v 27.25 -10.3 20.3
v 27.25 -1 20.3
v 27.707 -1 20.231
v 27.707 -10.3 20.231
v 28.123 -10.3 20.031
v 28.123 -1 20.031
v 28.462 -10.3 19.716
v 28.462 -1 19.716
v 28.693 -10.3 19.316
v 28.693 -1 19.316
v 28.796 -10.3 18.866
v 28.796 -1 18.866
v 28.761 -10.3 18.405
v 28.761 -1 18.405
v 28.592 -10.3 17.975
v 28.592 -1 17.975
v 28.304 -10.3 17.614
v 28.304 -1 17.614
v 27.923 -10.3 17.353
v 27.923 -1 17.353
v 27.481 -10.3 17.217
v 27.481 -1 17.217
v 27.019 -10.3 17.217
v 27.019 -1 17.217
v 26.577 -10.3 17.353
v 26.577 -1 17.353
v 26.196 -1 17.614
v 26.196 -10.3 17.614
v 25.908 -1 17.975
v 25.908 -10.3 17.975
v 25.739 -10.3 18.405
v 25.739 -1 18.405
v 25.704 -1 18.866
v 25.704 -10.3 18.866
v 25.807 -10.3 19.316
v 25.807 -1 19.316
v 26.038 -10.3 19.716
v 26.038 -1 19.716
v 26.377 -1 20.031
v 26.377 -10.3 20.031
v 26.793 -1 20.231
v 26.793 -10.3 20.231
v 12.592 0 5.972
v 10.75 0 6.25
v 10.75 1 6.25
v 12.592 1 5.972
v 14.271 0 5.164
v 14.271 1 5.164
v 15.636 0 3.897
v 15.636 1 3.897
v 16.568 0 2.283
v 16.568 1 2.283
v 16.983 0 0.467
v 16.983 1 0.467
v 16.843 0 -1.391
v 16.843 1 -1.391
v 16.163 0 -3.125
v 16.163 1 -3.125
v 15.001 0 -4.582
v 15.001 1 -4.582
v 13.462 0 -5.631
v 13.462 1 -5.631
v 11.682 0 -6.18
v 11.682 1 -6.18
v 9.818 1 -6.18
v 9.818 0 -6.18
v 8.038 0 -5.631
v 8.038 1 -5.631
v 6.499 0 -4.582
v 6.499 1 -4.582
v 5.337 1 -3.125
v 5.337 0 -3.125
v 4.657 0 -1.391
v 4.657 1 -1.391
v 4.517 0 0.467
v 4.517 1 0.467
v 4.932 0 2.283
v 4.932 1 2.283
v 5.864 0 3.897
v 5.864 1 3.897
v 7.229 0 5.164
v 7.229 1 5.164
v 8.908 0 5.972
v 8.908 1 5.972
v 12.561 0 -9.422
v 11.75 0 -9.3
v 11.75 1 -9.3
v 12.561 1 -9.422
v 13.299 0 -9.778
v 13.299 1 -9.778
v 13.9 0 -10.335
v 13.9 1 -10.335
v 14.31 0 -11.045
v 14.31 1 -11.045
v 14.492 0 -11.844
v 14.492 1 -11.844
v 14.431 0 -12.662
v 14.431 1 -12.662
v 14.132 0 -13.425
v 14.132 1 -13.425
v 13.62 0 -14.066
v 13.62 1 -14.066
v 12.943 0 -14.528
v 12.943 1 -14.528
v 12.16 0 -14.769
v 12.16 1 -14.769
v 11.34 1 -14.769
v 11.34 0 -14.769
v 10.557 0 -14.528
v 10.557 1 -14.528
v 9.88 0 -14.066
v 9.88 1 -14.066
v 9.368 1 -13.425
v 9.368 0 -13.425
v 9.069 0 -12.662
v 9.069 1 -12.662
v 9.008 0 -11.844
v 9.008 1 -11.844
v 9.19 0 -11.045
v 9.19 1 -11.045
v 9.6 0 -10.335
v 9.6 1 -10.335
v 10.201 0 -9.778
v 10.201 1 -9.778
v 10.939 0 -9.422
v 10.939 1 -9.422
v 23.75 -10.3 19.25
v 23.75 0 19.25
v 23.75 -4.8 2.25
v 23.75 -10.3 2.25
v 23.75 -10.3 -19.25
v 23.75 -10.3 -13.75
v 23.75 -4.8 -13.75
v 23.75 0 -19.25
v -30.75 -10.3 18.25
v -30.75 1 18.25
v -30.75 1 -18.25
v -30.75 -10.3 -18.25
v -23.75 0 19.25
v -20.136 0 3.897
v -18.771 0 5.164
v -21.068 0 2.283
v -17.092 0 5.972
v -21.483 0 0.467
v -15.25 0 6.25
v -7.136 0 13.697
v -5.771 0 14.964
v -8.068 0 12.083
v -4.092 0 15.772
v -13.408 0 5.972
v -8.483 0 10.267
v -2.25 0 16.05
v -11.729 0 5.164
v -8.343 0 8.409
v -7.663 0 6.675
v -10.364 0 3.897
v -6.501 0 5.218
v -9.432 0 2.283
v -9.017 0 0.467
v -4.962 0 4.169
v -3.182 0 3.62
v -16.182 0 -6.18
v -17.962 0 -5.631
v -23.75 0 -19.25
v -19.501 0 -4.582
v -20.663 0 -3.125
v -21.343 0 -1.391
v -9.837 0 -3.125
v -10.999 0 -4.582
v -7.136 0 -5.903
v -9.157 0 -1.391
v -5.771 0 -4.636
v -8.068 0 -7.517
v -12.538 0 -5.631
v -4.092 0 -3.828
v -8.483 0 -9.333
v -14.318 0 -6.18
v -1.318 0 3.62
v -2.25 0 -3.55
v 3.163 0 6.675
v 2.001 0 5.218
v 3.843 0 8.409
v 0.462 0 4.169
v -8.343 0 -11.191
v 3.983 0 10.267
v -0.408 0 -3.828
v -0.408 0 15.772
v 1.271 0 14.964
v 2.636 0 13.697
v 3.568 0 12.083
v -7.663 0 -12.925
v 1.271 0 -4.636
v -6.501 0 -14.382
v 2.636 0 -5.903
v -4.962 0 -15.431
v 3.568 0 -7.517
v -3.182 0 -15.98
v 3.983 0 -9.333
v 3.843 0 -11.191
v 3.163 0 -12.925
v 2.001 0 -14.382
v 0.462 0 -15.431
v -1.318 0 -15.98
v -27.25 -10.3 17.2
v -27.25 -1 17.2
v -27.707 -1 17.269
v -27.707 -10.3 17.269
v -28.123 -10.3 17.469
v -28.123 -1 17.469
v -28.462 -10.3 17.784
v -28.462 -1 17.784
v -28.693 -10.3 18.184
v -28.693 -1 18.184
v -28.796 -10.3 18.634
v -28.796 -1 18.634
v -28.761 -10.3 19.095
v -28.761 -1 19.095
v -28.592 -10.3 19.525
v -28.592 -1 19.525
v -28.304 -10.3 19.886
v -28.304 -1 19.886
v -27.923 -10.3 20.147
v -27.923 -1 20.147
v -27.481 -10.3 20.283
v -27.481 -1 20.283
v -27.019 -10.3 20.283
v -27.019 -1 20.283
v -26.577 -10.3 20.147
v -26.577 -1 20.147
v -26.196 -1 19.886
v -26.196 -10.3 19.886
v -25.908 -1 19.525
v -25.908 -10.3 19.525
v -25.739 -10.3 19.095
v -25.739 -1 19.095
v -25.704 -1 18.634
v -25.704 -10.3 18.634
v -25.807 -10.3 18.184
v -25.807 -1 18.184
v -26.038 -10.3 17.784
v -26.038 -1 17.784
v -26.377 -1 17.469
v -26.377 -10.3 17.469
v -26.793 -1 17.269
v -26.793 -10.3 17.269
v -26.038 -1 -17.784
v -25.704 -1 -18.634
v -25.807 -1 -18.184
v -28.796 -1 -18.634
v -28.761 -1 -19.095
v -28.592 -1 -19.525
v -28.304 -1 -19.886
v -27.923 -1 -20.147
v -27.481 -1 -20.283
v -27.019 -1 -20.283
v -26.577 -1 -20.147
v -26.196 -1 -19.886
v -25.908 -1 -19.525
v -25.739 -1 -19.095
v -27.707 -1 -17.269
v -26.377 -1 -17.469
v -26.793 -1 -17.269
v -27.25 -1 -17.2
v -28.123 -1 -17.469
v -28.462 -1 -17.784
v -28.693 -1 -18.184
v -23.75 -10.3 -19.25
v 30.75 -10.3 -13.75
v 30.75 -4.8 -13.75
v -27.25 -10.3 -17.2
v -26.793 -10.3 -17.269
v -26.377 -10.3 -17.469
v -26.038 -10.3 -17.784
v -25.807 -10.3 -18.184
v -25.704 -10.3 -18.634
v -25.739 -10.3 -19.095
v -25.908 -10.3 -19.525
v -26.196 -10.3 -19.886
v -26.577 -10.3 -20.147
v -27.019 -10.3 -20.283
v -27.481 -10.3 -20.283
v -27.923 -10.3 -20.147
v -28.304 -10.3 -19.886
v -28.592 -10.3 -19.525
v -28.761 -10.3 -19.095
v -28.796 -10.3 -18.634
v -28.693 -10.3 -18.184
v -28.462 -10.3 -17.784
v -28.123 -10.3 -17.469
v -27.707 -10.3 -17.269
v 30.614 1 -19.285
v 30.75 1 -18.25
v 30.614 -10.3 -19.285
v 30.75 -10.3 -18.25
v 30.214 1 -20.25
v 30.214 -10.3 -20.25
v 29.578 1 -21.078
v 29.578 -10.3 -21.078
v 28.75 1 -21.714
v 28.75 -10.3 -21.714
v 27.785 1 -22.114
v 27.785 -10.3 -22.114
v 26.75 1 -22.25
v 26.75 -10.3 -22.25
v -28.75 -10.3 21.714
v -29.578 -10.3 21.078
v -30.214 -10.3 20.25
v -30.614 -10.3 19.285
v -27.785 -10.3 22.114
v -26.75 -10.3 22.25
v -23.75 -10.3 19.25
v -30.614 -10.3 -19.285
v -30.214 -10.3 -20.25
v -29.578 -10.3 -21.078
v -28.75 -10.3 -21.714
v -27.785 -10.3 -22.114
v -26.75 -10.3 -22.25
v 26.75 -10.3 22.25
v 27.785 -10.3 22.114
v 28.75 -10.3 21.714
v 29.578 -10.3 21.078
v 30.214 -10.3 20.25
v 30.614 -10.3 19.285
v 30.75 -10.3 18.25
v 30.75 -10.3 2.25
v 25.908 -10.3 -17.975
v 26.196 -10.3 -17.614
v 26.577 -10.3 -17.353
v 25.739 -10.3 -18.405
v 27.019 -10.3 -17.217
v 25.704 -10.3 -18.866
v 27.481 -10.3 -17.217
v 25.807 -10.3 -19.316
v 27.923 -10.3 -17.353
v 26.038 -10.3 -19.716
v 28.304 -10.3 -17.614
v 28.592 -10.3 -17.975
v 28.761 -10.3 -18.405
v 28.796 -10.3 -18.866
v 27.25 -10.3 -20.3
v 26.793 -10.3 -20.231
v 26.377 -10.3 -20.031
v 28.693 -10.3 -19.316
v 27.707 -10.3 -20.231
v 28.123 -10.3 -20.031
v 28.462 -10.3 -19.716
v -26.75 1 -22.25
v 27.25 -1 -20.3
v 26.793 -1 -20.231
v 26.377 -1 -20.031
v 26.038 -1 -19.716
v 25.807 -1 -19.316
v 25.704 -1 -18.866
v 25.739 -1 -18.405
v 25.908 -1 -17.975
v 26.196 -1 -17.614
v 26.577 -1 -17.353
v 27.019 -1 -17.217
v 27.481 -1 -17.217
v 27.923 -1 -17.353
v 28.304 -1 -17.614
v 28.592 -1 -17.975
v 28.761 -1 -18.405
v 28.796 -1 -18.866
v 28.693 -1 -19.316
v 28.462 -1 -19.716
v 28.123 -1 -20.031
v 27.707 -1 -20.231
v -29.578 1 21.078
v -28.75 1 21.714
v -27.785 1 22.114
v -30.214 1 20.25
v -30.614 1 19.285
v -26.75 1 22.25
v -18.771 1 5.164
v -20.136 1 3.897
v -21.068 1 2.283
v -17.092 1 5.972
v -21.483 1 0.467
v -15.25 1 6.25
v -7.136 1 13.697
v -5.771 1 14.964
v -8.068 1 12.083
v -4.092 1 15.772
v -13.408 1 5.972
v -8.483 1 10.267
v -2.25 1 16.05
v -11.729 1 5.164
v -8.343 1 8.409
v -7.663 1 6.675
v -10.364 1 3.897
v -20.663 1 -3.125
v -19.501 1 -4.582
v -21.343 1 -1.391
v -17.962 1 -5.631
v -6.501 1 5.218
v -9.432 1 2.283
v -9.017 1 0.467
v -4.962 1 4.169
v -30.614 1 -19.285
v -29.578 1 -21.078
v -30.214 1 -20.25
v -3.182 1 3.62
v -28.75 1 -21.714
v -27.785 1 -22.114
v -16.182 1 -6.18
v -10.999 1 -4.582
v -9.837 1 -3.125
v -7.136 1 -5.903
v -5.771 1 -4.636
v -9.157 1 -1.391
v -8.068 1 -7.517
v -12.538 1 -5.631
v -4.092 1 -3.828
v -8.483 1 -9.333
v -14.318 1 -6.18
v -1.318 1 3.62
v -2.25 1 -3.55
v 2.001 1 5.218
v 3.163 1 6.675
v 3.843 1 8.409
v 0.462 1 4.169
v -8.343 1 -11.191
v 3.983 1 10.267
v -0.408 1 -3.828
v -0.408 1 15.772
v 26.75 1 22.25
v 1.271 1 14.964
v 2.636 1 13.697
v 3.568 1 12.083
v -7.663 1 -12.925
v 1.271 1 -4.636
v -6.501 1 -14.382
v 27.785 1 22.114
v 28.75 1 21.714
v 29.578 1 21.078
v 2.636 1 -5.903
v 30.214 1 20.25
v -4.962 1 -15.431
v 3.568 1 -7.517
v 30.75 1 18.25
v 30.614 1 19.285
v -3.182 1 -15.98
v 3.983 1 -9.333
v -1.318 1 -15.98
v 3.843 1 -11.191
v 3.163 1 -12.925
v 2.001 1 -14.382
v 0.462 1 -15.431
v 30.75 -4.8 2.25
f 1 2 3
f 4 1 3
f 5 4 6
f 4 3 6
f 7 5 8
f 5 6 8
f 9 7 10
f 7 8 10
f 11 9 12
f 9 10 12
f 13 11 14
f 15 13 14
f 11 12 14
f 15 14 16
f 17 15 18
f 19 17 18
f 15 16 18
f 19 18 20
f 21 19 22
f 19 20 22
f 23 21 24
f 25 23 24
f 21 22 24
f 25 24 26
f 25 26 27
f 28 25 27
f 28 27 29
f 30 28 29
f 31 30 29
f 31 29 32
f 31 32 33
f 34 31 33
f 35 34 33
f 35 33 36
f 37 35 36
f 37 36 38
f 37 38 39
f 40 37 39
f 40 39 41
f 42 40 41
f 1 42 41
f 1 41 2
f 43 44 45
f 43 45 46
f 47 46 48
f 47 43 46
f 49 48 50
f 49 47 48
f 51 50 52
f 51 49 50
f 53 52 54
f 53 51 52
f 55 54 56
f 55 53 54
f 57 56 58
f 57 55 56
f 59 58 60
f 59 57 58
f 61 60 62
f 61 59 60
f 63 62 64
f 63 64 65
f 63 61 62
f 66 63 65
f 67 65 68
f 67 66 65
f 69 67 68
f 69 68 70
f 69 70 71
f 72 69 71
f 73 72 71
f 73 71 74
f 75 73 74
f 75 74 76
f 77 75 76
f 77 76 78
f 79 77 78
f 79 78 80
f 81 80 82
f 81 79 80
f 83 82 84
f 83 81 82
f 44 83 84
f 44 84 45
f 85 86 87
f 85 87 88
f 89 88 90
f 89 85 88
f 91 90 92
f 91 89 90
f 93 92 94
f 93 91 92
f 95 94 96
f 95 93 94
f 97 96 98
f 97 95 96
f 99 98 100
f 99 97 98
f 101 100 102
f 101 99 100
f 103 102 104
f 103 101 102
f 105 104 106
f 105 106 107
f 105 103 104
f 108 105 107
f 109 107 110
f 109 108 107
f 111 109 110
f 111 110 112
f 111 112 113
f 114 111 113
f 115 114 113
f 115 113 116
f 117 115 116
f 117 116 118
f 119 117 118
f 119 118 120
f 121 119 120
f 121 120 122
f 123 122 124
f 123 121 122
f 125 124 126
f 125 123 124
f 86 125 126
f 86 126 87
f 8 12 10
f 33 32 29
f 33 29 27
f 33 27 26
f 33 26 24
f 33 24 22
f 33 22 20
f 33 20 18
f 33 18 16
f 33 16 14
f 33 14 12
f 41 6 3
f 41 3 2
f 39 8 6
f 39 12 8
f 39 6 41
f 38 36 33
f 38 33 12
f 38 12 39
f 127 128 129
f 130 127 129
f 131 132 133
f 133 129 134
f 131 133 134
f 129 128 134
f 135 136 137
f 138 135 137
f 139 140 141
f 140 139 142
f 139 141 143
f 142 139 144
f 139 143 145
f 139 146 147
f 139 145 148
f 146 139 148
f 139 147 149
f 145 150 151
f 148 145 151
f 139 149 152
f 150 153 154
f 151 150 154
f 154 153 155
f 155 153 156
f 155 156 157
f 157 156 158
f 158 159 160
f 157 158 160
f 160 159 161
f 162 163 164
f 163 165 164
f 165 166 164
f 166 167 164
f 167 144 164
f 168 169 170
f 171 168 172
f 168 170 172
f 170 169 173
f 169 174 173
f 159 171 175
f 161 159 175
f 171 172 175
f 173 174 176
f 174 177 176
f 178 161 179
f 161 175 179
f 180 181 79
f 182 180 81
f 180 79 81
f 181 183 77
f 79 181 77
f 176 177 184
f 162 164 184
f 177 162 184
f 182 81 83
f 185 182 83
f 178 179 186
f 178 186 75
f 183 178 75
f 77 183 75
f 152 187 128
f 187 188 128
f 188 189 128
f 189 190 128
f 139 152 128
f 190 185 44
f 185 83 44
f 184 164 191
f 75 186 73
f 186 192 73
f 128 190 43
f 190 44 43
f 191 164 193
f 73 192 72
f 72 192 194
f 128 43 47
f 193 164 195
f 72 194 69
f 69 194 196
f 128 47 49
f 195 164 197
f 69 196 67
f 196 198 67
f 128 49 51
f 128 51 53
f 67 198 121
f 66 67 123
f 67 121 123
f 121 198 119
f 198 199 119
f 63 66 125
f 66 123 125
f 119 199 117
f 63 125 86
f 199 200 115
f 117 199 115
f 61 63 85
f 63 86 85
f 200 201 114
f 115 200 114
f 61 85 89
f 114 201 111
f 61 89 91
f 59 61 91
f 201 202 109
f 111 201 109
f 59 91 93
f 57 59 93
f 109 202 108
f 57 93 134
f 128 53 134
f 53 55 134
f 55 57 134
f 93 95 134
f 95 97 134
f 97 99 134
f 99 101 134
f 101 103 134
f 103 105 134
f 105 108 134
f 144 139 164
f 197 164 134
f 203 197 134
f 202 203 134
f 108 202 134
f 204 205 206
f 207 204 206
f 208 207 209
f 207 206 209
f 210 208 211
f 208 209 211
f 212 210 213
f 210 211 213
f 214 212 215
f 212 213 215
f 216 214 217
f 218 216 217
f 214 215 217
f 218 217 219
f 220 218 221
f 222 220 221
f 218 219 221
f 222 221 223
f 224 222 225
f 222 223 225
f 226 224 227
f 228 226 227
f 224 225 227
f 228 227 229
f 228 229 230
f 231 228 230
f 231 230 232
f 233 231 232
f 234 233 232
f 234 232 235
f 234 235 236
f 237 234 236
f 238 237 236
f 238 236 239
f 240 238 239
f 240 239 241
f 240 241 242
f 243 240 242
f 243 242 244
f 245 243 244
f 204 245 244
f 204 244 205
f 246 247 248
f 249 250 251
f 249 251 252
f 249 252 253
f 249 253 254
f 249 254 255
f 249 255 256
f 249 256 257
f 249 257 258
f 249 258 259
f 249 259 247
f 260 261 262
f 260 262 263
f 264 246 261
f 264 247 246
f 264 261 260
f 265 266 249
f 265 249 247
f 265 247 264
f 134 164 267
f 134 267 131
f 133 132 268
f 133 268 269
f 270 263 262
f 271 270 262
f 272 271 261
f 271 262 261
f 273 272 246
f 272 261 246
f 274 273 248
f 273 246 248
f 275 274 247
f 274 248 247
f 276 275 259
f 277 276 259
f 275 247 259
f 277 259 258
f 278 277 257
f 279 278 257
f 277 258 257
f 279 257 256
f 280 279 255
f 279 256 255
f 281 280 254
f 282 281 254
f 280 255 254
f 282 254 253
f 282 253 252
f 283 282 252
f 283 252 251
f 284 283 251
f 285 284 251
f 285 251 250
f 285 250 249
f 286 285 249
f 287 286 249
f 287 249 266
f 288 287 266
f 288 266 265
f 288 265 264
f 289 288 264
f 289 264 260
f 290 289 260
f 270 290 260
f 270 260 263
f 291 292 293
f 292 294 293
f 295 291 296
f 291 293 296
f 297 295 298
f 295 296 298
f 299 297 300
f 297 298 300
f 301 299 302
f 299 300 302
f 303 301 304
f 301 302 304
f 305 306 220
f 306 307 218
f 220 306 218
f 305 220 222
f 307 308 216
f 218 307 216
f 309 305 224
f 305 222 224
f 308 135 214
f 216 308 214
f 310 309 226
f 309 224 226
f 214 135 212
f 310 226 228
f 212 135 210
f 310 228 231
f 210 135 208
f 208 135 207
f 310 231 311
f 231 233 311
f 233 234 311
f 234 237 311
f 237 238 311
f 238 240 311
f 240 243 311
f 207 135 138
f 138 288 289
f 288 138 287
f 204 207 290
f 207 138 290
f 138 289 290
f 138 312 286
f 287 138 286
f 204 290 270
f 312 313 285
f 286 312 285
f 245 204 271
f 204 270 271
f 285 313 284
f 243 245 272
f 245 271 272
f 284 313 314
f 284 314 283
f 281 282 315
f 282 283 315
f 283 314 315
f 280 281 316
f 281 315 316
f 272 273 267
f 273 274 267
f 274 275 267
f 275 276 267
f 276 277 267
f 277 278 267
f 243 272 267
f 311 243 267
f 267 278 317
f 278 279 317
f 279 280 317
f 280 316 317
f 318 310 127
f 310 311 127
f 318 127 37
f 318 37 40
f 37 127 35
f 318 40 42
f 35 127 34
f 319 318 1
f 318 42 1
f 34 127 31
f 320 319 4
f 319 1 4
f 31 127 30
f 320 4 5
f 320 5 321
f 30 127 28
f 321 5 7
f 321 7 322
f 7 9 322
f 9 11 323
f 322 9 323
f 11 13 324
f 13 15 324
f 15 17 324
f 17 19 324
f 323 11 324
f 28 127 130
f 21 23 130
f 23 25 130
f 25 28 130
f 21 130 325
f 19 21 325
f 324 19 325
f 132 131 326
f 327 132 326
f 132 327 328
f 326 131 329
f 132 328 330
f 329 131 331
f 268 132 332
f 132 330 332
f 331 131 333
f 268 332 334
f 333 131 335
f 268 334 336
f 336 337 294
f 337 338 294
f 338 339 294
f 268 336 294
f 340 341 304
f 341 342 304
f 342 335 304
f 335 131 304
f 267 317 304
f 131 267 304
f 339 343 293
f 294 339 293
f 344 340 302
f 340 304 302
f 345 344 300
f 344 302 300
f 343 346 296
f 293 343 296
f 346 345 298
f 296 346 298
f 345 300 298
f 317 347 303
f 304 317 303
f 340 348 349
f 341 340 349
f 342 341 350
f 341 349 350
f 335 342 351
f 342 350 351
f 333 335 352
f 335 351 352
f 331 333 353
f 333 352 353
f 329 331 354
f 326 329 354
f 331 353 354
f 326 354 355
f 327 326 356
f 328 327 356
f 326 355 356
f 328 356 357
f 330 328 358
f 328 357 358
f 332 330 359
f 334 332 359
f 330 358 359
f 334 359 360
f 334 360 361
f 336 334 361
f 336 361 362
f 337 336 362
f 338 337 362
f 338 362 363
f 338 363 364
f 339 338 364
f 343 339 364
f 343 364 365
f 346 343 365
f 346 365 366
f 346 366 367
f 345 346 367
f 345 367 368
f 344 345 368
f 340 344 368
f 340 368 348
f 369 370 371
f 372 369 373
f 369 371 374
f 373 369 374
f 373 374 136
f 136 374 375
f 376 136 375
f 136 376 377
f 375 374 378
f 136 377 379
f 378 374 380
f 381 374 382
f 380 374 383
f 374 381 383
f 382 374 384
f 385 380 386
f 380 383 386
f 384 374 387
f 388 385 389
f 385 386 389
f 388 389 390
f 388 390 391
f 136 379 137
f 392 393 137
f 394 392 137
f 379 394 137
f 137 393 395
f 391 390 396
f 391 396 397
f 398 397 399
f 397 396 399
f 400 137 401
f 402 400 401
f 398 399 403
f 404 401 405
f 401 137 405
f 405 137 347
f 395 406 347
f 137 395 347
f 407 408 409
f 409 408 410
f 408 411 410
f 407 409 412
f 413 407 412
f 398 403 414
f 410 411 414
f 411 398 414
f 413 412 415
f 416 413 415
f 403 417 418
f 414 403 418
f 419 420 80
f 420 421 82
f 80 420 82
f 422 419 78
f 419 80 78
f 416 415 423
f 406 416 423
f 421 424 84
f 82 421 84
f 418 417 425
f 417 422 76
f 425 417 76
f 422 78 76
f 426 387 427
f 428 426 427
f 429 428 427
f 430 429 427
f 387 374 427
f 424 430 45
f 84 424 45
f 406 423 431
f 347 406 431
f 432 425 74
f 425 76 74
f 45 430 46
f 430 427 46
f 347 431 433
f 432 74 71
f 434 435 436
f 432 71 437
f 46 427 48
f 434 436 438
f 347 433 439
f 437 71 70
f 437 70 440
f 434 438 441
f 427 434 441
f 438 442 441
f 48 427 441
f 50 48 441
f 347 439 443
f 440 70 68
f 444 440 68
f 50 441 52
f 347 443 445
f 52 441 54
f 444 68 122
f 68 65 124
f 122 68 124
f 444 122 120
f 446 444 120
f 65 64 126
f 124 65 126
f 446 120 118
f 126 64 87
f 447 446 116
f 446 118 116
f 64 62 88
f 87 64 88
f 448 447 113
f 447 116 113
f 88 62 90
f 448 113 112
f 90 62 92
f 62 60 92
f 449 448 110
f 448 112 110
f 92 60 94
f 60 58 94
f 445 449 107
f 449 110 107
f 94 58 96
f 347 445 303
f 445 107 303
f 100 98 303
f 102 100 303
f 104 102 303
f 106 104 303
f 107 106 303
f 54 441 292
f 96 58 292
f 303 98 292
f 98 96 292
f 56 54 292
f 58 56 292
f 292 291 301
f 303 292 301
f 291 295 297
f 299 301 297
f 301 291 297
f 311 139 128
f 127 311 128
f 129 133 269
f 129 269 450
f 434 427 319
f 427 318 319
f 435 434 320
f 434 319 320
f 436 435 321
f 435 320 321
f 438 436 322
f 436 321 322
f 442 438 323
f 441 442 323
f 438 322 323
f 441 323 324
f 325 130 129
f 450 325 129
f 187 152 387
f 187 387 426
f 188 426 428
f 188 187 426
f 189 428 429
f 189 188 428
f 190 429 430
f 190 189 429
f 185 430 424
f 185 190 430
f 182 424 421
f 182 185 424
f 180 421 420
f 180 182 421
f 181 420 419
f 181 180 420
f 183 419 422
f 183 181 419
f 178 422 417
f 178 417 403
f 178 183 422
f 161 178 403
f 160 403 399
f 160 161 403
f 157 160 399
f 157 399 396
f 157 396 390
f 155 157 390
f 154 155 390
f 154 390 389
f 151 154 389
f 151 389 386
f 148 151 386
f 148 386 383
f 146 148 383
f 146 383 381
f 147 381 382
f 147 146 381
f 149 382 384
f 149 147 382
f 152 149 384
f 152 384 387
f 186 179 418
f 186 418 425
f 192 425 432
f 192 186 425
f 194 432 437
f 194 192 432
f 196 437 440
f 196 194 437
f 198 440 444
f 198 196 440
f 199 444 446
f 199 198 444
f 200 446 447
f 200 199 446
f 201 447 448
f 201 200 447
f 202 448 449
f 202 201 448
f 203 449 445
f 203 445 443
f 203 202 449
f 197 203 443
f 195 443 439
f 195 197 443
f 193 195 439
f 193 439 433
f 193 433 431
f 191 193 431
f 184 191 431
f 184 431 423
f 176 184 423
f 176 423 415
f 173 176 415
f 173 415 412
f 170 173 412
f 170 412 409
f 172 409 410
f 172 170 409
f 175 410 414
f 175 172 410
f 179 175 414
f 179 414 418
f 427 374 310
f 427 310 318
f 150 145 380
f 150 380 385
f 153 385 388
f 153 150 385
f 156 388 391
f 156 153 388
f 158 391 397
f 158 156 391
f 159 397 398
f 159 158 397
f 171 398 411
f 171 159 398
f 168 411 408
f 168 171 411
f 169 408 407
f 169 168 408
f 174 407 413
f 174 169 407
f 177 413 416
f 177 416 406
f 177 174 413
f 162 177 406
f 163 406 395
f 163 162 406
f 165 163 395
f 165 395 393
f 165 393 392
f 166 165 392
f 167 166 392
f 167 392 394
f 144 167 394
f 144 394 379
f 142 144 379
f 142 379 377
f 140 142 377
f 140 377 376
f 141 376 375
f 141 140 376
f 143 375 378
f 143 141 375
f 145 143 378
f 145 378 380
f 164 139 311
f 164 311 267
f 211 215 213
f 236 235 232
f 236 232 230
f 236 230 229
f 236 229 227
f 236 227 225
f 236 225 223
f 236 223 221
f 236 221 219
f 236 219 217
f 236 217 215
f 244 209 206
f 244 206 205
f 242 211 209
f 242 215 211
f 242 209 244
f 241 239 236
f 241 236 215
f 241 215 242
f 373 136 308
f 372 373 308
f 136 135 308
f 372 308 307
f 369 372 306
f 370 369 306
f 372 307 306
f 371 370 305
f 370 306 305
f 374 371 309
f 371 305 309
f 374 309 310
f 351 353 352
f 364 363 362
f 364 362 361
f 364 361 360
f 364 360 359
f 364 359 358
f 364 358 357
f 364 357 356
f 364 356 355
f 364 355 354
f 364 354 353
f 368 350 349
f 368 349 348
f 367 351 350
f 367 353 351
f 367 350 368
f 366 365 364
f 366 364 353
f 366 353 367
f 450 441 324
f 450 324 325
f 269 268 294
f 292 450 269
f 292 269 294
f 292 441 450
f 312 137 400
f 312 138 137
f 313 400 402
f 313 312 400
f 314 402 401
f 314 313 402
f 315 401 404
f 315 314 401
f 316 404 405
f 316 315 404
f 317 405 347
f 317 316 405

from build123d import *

# Parameters (mm, degrees)
SKETCH1_W           = 47.5
SKETCH1_H           = 38.5
SKETCH1_R           = 6.25
SKETCH1_R_2         = 2.75
BOSS_EXTRUDE2_DEPTH = 1
SKETCH2_W           = 61.5
SKETCH2_H           = 44.5
SKETCH2_R           = 1.55
SKETCH2_W_2         = 47.5
SKETCH2_H_2         = 38.5
BOSS_EXTRUDE3_DEPTH = 11.3
SKETCH3_R           = 1.55
BOSS_EXTRUDE4_DEPTH = 2
FILLET2_R           = 4
SKETCH4_W           = 16
SKETCH4_H           = 5.5
CUT_EXTRUDE1_DEPTH  = 8


with BuildPart() as part:
    # Sketch1 → Boss-Extrude2 (new body)
    with BuildSketch(Plane(origin=(0, 0, 0), x_dir=(1, 0, 0), z_dir=(0, 1, 0))):
        Rectangle(SKETCH1_W, SKETCH1_H)
        with Locations(Location((-2.25, 9.8, 0), (0, 0, 270))):
            Circle(SKETCH1_R, mode=Mode.SUBTRACT)
        with Locations(Location((10.75, 0, 0), (0, 0, 270))):
            Circle(SKETCH1_R, mode=Mode.SUBTRACT)
        with Locations(Location((-15.25, 0, 0), (0, 0, 270))):
            Circle(SKETCH1_R, mode=Mode.SUBTRACT)
        with Locations(Location((-2.25, -9.8, 0), (0, 0, 270))):
            Circle(SKETCH1_R, mode=Mode.SUBTRACT)
        with Locations(Location((11.75, 12.05, 0), (0, 0, 270))):
            Circle(SKETCH1_R_2, mode=Mode.SUBTRACT)
    extrude(amount=BOSS_EXTRUDE2_DEPTH)

    # Sketch2 → Boss-Extrude3 (add)
    with BuildSketch(Plane(origin=(0, 1, 0), x_dir=(1, 0, 0), z_dir=(0, 1, 0))):
        Rectangle(SKETCH2_W, SKETCH2_H)
        with Locations(Location((-27.25, 18.75, 0), (0, 0, 270))):
            Circle(SKETCH2_R, mode=Mode.SUBTRACT)
        with Locations(Location((27.25, 18.75, 0), (0, 0, 90))):
            Circle(SKETCH2_R, mode=Mode.SUBTRACT)
        with Locations(Location((27.25, -18.75, 0), (0, 0, 270))):
            Circle(SKETCH2_R, mode=Mode.SUBTRACT)
        with Locations(Location((-27.25, -18.75, 0), (0, 0, 90))):
            Circle(SKETCH2_R, mode=Mode.SUBTRACT)
        Rectangle(SKETCH2_W_2, SKETCH2_H_2, mode=Mode.SUBTRACT)
    extrude(amount=-BOSS_EXTRUDE3_DEPTH)

    # Sketch3 → Boss-Extrude4 (add)
    with BuildSketch(Plane.XZ.offset(-1)):
        with Locations(Location((27.25, -18.75, 0), (0, 0, 270))):
            Circle(SKETCH3_R)
        with Locations(Location((27.25, 18.75, 0), (0, 0, 90))):
            Circle(SKETCH3_R)
        with Locations(Location((-27.25, 18.75, 0), (0, 0, 270))):
            Circle(SKETCH3_R)
        with Locations(Location((-27.25, -18.75, 0), (0, 0, 90))):
            Circle(SKETCH3_R)
    extrude(amount=BOSS_EXTRUDE4_DEPTH)

    # Fillet2
    fillet2_edges = [part.edges().sort_by_distance(p)[0] for p in [
        (-30.75, -4.65, 22.25),
        (-30.75, -4.65, -22.25),
        (30.75, -4.65, -22.25),
        (30.75, -4.65, 22.25),
    ]]
    fillet(fillet2_edges, radius=FILLET2_R)

    # Sketch4 → Cut-Extrude1 (cut)
    with BuildSketch(Plane.ZY.offset(-23.75)):
        with Locations((-5.75, -7.55)):
            Rectangle(SKETCH4_W, SKETCH4_H)
    extrude(amount=-CUT_EXTRUDE1_DEPTH, mode=Mode.SUBTRACT)


solid = part.part
